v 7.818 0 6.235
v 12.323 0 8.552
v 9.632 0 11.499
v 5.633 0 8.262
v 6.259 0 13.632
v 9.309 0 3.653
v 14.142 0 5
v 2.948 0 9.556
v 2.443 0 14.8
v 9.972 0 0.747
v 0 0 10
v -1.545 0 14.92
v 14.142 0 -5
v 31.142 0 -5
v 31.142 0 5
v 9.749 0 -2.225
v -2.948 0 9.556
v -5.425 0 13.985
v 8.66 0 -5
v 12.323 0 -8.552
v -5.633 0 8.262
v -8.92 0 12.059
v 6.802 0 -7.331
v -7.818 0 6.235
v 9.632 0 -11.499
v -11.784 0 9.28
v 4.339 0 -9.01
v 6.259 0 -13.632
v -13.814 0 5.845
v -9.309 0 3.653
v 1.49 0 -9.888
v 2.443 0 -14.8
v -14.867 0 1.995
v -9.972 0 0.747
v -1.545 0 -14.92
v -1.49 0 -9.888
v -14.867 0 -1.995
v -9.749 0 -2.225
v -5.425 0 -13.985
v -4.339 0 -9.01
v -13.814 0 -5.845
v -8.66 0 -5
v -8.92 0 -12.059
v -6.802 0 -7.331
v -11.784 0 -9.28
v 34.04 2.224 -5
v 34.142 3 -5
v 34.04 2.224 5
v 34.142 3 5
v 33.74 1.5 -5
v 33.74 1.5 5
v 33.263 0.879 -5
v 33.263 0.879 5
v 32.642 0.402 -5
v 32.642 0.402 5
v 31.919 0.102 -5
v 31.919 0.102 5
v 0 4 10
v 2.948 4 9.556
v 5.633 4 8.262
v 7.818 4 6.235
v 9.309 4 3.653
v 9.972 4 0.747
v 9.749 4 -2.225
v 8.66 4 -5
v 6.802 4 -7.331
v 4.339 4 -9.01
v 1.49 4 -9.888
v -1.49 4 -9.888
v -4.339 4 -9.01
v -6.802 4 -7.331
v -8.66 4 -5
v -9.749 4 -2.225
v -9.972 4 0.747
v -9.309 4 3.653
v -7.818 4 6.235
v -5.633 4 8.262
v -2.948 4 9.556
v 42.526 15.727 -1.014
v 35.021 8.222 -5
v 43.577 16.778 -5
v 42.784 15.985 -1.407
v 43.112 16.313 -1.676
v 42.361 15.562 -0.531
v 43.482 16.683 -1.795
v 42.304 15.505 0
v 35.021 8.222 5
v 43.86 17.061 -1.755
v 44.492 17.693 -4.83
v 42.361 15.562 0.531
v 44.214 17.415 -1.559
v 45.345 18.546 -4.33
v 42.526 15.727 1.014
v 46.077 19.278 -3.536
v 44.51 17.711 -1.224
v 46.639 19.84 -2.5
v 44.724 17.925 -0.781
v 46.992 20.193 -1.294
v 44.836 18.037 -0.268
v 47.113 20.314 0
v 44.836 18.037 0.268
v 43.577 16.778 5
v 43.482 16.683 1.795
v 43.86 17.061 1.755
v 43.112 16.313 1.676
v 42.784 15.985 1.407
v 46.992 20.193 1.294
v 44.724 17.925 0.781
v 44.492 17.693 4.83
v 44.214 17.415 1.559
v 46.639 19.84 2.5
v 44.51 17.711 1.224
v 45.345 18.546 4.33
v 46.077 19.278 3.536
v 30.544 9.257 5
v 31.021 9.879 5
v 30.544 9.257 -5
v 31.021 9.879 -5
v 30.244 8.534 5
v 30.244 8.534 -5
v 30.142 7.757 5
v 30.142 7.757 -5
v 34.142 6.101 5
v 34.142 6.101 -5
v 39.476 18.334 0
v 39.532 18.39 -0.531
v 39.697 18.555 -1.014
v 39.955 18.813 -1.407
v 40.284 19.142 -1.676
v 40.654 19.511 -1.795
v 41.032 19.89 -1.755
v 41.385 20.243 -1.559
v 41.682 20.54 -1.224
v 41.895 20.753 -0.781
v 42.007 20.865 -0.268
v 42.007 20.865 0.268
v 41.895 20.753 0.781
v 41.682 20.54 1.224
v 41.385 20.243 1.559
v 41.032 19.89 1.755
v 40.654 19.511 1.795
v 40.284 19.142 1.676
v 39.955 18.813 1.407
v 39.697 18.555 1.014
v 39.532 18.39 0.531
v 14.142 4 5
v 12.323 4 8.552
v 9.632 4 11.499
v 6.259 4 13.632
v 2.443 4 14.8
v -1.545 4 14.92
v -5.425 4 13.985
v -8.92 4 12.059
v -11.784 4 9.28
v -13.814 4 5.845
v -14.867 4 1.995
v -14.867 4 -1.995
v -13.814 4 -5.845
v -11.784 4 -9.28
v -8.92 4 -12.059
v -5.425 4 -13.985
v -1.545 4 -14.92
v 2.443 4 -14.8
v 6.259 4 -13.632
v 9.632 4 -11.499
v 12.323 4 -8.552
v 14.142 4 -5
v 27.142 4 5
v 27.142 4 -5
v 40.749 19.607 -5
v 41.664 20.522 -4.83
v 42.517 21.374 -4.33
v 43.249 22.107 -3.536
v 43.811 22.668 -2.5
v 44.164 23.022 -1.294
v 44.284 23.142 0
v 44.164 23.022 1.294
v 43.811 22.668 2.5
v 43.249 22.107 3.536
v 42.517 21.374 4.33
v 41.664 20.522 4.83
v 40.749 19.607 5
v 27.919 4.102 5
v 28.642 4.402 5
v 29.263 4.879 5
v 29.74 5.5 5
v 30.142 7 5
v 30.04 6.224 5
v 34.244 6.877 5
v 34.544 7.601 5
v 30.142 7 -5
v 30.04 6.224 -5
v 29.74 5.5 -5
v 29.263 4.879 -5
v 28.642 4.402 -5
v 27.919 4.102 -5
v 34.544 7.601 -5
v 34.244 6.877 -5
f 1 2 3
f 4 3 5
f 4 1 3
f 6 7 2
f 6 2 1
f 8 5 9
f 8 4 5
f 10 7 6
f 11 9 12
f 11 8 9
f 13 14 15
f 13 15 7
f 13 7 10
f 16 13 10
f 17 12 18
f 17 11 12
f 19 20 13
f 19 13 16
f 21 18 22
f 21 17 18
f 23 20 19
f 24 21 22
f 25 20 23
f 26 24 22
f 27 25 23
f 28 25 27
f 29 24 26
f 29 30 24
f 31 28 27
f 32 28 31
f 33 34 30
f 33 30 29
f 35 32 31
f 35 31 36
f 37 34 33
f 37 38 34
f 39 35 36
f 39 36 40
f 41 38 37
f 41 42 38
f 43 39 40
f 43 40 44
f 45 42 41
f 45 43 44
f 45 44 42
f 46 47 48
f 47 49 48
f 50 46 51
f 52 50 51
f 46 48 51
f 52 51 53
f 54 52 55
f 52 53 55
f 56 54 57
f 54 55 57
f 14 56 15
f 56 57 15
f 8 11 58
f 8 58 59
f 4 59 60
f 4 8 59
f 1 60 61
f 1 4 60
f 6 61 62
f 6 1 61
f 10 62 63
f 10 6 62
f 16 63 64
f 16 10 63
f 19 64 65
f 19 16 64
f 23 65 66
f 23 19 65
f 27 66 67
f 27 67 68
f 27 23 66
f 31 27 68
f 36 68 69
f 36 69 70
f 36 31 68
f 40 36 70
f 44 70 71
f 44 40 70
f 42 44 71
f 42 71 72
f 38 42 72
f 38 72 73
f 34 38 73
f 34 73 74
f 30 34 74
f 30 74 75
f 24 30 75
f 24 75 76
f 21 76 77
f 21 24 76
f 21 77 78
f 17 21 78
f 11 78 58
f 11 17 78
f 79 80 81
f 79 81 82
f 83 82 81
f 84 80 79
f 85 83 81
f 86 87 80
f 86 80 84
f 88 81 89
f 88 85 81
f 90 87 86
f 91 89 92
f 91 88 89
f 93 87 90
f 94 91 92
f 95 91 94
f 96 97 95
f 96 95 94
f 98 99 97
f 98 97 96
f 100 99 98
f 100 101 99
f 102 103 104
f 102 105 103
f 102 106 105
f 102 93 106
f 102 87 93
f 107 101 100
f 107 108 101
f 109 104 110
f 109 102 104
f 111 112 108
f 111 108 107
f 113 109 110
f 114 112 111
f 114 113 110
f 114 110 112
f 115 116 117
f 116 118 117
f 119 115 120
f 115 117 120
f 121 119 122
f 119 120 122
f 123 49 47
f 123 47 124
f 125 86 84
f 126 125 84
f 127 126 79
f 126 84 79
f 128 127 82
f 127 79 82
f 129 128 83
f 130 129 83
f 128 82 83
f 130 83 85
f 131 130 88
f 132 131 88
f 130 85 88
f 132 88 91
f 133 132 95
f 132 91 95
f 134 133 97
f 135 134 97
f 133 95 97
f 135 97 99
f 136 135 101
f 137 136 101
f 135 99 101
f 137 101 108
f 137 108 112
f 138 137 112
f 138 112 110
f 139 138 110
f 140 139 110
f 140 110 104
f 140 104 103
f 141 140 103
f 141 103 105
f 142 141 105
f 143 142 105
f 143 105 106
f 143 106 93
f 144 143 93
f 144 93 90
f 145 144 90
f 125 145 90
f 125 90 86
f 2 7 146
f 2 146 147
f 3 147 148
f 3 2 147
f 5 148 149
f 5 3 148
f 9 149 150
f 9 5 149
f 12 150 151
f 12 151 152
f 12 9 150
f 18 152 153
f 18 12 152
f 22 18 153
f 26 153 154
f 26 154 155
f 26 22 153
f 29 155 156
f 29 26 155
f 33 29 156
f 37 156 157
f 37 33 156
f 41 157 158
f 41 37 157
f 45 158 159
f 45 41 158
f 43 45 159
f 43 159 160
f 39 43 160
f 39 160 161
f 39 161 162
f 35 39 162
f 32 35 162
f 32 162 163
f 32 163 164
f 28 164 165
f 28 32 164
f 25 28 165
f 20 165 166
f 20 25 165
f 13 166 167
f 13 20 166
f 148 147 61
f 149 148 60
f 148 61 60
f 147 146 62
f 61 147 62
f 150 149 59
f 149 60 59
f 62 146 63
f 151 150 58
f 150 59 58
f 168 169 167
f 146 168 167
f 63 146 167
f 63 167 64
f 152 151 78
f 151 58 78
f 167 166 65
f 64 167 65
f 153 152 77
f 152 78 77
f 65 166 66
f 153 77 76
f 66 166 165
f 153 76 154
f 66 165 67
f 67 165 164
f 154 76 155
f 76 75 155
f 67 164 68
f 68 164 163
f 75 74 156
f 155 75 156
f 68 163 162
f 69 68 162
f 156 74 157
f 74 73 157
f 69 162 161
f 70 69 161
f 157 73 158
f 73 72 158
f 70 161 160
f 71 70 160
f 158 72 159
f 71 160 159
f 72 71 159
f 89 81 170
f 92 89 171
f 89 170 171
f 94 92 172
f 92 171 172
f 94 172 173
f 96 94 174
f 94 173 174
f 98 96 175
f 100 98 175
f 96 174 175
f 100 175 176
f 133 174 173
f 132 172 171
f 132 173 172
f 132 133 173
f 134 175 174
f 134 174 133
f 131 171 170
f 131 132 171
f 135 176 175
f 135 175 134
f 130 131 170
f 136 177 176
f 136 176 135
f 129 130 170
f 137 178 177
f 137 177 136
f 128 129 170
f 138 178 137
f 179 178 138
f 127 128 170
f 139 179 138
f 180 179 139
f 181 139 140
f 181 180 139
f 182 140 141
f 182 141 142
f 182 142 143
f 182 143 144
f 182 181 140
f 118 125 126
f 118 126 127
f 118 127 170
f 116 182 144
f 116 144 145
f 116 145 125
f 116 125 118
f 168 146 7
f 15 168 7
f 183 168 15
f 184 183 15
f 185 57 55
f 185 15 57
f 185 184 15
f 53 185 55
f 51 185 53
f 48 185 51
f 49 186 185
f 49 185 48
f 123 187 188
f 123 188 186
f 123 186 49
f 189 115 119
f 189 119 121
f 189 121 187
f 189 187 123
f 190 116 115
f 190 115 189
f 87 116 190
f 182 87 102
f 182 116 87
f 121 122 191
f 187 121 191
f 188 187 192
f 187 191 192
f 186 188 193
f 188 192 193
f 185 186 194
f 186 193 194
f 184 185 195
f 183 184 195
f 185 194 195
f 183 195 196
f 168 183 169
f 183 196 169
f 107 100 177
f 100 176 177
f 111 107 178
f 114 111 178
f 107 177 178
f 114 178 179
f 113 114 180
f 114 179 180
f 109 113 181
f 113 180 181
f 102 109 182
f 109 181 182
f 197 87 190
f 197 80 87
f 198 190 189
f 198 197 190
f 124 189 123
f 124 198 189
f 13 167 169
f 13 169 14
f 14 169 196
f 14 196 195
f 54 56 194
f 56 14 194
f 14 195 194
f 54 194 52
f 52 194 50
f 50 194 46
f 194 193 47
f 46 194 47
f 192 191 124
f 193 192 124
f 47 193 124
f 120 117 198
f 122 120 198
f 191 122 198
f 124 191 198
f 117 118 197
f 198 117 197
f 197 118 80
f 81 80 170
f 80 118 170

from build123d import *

# Parameters (mm, degrees)
SKETCH2_R            = 10
BOSS_EXTRUDE1_DEPTH  = 4
BOSS_EXTRUDE2_DEPTH  = 10
FILLET1_R            = 5
M3_CLEARANCE_HOLE1_D = 3.6
FILLET2_R            = 3


with BuildPart() as part:
    # Sketch2 → Boss-Extrude1 (new body)
    with BuildSketch(Plane(origin=(0, 0, 0), x_dir=(1, 0, 0), z_dir=(0, 1, 0))):
        with BuildLine():
            Line((34.142135624, 5), (34.142135624, -5))
            Line((34.142135624, -5), (14.142135624, -5))
            ThreePointArc((14.142135624, -5), (-15, 0), (14.142135624, 5))
            Line((14.142135624, 5), (34.142135624, 5))
        make_face()
        with Locations(Location((0, 0, 0), (0, 0, 270))):
            Circle(SKETCH2_R, mode=Mode.SUBTRACT)
    extrude(amount=BOSS_EXTRUDE1_DEPTH)

    # Sketch3 → Boss-Extrude2 (add)
    with BuildSketch(Plane.XY.offset(5)):
        Polygon((34.142135624, 4), (34.142135624, 7.343145751), (47.112698372, 20.313708499), (44.284271247, 23.142135624), (30.142135624, 9), (30.142135624, 4), align=None)
    extrude(amount=-BOSS_EXTRUDE2_DEPTH)

    # Fillet1
    fillet1_edges = [part.edges().sort_by_distance(p)[0] for p in [
        (45.69848481, 21.727922061, 5),
        (45.69848481, 21.727922061, -5),
    ]]
    fillet(fillet1_edges, radius=FILLET1_R - 0.0001)  # a hair under: the kernel refuses the full size

    # M3 Clearance Hole1 (through all)
    with Locations(Plane(origin=(10.571067812, -10.571067812, 0), x_dir=(0.7071067811865486, 0.7071067811865466, 0), z_dir=(-0.7071067811865466, 0.7071067811865486, 0))):
        with Locations((42.67766953, 0)):
            Hole(M3_CLEARANCE_HOLE1_D / 2)

    # Fillet2
    fillet2_edges = [part.edges().sort_by_distance(p)[0] for p in [
        (30.142135624, 4, 0),
        (30.142135624, 9, 0),
        (34.142135624, 7.343145751, 0),
        (34.142135624, 0, 0),
    ]]
    fillet(fillet2_edges, radius=FILLET2_R)


solid = part.part
